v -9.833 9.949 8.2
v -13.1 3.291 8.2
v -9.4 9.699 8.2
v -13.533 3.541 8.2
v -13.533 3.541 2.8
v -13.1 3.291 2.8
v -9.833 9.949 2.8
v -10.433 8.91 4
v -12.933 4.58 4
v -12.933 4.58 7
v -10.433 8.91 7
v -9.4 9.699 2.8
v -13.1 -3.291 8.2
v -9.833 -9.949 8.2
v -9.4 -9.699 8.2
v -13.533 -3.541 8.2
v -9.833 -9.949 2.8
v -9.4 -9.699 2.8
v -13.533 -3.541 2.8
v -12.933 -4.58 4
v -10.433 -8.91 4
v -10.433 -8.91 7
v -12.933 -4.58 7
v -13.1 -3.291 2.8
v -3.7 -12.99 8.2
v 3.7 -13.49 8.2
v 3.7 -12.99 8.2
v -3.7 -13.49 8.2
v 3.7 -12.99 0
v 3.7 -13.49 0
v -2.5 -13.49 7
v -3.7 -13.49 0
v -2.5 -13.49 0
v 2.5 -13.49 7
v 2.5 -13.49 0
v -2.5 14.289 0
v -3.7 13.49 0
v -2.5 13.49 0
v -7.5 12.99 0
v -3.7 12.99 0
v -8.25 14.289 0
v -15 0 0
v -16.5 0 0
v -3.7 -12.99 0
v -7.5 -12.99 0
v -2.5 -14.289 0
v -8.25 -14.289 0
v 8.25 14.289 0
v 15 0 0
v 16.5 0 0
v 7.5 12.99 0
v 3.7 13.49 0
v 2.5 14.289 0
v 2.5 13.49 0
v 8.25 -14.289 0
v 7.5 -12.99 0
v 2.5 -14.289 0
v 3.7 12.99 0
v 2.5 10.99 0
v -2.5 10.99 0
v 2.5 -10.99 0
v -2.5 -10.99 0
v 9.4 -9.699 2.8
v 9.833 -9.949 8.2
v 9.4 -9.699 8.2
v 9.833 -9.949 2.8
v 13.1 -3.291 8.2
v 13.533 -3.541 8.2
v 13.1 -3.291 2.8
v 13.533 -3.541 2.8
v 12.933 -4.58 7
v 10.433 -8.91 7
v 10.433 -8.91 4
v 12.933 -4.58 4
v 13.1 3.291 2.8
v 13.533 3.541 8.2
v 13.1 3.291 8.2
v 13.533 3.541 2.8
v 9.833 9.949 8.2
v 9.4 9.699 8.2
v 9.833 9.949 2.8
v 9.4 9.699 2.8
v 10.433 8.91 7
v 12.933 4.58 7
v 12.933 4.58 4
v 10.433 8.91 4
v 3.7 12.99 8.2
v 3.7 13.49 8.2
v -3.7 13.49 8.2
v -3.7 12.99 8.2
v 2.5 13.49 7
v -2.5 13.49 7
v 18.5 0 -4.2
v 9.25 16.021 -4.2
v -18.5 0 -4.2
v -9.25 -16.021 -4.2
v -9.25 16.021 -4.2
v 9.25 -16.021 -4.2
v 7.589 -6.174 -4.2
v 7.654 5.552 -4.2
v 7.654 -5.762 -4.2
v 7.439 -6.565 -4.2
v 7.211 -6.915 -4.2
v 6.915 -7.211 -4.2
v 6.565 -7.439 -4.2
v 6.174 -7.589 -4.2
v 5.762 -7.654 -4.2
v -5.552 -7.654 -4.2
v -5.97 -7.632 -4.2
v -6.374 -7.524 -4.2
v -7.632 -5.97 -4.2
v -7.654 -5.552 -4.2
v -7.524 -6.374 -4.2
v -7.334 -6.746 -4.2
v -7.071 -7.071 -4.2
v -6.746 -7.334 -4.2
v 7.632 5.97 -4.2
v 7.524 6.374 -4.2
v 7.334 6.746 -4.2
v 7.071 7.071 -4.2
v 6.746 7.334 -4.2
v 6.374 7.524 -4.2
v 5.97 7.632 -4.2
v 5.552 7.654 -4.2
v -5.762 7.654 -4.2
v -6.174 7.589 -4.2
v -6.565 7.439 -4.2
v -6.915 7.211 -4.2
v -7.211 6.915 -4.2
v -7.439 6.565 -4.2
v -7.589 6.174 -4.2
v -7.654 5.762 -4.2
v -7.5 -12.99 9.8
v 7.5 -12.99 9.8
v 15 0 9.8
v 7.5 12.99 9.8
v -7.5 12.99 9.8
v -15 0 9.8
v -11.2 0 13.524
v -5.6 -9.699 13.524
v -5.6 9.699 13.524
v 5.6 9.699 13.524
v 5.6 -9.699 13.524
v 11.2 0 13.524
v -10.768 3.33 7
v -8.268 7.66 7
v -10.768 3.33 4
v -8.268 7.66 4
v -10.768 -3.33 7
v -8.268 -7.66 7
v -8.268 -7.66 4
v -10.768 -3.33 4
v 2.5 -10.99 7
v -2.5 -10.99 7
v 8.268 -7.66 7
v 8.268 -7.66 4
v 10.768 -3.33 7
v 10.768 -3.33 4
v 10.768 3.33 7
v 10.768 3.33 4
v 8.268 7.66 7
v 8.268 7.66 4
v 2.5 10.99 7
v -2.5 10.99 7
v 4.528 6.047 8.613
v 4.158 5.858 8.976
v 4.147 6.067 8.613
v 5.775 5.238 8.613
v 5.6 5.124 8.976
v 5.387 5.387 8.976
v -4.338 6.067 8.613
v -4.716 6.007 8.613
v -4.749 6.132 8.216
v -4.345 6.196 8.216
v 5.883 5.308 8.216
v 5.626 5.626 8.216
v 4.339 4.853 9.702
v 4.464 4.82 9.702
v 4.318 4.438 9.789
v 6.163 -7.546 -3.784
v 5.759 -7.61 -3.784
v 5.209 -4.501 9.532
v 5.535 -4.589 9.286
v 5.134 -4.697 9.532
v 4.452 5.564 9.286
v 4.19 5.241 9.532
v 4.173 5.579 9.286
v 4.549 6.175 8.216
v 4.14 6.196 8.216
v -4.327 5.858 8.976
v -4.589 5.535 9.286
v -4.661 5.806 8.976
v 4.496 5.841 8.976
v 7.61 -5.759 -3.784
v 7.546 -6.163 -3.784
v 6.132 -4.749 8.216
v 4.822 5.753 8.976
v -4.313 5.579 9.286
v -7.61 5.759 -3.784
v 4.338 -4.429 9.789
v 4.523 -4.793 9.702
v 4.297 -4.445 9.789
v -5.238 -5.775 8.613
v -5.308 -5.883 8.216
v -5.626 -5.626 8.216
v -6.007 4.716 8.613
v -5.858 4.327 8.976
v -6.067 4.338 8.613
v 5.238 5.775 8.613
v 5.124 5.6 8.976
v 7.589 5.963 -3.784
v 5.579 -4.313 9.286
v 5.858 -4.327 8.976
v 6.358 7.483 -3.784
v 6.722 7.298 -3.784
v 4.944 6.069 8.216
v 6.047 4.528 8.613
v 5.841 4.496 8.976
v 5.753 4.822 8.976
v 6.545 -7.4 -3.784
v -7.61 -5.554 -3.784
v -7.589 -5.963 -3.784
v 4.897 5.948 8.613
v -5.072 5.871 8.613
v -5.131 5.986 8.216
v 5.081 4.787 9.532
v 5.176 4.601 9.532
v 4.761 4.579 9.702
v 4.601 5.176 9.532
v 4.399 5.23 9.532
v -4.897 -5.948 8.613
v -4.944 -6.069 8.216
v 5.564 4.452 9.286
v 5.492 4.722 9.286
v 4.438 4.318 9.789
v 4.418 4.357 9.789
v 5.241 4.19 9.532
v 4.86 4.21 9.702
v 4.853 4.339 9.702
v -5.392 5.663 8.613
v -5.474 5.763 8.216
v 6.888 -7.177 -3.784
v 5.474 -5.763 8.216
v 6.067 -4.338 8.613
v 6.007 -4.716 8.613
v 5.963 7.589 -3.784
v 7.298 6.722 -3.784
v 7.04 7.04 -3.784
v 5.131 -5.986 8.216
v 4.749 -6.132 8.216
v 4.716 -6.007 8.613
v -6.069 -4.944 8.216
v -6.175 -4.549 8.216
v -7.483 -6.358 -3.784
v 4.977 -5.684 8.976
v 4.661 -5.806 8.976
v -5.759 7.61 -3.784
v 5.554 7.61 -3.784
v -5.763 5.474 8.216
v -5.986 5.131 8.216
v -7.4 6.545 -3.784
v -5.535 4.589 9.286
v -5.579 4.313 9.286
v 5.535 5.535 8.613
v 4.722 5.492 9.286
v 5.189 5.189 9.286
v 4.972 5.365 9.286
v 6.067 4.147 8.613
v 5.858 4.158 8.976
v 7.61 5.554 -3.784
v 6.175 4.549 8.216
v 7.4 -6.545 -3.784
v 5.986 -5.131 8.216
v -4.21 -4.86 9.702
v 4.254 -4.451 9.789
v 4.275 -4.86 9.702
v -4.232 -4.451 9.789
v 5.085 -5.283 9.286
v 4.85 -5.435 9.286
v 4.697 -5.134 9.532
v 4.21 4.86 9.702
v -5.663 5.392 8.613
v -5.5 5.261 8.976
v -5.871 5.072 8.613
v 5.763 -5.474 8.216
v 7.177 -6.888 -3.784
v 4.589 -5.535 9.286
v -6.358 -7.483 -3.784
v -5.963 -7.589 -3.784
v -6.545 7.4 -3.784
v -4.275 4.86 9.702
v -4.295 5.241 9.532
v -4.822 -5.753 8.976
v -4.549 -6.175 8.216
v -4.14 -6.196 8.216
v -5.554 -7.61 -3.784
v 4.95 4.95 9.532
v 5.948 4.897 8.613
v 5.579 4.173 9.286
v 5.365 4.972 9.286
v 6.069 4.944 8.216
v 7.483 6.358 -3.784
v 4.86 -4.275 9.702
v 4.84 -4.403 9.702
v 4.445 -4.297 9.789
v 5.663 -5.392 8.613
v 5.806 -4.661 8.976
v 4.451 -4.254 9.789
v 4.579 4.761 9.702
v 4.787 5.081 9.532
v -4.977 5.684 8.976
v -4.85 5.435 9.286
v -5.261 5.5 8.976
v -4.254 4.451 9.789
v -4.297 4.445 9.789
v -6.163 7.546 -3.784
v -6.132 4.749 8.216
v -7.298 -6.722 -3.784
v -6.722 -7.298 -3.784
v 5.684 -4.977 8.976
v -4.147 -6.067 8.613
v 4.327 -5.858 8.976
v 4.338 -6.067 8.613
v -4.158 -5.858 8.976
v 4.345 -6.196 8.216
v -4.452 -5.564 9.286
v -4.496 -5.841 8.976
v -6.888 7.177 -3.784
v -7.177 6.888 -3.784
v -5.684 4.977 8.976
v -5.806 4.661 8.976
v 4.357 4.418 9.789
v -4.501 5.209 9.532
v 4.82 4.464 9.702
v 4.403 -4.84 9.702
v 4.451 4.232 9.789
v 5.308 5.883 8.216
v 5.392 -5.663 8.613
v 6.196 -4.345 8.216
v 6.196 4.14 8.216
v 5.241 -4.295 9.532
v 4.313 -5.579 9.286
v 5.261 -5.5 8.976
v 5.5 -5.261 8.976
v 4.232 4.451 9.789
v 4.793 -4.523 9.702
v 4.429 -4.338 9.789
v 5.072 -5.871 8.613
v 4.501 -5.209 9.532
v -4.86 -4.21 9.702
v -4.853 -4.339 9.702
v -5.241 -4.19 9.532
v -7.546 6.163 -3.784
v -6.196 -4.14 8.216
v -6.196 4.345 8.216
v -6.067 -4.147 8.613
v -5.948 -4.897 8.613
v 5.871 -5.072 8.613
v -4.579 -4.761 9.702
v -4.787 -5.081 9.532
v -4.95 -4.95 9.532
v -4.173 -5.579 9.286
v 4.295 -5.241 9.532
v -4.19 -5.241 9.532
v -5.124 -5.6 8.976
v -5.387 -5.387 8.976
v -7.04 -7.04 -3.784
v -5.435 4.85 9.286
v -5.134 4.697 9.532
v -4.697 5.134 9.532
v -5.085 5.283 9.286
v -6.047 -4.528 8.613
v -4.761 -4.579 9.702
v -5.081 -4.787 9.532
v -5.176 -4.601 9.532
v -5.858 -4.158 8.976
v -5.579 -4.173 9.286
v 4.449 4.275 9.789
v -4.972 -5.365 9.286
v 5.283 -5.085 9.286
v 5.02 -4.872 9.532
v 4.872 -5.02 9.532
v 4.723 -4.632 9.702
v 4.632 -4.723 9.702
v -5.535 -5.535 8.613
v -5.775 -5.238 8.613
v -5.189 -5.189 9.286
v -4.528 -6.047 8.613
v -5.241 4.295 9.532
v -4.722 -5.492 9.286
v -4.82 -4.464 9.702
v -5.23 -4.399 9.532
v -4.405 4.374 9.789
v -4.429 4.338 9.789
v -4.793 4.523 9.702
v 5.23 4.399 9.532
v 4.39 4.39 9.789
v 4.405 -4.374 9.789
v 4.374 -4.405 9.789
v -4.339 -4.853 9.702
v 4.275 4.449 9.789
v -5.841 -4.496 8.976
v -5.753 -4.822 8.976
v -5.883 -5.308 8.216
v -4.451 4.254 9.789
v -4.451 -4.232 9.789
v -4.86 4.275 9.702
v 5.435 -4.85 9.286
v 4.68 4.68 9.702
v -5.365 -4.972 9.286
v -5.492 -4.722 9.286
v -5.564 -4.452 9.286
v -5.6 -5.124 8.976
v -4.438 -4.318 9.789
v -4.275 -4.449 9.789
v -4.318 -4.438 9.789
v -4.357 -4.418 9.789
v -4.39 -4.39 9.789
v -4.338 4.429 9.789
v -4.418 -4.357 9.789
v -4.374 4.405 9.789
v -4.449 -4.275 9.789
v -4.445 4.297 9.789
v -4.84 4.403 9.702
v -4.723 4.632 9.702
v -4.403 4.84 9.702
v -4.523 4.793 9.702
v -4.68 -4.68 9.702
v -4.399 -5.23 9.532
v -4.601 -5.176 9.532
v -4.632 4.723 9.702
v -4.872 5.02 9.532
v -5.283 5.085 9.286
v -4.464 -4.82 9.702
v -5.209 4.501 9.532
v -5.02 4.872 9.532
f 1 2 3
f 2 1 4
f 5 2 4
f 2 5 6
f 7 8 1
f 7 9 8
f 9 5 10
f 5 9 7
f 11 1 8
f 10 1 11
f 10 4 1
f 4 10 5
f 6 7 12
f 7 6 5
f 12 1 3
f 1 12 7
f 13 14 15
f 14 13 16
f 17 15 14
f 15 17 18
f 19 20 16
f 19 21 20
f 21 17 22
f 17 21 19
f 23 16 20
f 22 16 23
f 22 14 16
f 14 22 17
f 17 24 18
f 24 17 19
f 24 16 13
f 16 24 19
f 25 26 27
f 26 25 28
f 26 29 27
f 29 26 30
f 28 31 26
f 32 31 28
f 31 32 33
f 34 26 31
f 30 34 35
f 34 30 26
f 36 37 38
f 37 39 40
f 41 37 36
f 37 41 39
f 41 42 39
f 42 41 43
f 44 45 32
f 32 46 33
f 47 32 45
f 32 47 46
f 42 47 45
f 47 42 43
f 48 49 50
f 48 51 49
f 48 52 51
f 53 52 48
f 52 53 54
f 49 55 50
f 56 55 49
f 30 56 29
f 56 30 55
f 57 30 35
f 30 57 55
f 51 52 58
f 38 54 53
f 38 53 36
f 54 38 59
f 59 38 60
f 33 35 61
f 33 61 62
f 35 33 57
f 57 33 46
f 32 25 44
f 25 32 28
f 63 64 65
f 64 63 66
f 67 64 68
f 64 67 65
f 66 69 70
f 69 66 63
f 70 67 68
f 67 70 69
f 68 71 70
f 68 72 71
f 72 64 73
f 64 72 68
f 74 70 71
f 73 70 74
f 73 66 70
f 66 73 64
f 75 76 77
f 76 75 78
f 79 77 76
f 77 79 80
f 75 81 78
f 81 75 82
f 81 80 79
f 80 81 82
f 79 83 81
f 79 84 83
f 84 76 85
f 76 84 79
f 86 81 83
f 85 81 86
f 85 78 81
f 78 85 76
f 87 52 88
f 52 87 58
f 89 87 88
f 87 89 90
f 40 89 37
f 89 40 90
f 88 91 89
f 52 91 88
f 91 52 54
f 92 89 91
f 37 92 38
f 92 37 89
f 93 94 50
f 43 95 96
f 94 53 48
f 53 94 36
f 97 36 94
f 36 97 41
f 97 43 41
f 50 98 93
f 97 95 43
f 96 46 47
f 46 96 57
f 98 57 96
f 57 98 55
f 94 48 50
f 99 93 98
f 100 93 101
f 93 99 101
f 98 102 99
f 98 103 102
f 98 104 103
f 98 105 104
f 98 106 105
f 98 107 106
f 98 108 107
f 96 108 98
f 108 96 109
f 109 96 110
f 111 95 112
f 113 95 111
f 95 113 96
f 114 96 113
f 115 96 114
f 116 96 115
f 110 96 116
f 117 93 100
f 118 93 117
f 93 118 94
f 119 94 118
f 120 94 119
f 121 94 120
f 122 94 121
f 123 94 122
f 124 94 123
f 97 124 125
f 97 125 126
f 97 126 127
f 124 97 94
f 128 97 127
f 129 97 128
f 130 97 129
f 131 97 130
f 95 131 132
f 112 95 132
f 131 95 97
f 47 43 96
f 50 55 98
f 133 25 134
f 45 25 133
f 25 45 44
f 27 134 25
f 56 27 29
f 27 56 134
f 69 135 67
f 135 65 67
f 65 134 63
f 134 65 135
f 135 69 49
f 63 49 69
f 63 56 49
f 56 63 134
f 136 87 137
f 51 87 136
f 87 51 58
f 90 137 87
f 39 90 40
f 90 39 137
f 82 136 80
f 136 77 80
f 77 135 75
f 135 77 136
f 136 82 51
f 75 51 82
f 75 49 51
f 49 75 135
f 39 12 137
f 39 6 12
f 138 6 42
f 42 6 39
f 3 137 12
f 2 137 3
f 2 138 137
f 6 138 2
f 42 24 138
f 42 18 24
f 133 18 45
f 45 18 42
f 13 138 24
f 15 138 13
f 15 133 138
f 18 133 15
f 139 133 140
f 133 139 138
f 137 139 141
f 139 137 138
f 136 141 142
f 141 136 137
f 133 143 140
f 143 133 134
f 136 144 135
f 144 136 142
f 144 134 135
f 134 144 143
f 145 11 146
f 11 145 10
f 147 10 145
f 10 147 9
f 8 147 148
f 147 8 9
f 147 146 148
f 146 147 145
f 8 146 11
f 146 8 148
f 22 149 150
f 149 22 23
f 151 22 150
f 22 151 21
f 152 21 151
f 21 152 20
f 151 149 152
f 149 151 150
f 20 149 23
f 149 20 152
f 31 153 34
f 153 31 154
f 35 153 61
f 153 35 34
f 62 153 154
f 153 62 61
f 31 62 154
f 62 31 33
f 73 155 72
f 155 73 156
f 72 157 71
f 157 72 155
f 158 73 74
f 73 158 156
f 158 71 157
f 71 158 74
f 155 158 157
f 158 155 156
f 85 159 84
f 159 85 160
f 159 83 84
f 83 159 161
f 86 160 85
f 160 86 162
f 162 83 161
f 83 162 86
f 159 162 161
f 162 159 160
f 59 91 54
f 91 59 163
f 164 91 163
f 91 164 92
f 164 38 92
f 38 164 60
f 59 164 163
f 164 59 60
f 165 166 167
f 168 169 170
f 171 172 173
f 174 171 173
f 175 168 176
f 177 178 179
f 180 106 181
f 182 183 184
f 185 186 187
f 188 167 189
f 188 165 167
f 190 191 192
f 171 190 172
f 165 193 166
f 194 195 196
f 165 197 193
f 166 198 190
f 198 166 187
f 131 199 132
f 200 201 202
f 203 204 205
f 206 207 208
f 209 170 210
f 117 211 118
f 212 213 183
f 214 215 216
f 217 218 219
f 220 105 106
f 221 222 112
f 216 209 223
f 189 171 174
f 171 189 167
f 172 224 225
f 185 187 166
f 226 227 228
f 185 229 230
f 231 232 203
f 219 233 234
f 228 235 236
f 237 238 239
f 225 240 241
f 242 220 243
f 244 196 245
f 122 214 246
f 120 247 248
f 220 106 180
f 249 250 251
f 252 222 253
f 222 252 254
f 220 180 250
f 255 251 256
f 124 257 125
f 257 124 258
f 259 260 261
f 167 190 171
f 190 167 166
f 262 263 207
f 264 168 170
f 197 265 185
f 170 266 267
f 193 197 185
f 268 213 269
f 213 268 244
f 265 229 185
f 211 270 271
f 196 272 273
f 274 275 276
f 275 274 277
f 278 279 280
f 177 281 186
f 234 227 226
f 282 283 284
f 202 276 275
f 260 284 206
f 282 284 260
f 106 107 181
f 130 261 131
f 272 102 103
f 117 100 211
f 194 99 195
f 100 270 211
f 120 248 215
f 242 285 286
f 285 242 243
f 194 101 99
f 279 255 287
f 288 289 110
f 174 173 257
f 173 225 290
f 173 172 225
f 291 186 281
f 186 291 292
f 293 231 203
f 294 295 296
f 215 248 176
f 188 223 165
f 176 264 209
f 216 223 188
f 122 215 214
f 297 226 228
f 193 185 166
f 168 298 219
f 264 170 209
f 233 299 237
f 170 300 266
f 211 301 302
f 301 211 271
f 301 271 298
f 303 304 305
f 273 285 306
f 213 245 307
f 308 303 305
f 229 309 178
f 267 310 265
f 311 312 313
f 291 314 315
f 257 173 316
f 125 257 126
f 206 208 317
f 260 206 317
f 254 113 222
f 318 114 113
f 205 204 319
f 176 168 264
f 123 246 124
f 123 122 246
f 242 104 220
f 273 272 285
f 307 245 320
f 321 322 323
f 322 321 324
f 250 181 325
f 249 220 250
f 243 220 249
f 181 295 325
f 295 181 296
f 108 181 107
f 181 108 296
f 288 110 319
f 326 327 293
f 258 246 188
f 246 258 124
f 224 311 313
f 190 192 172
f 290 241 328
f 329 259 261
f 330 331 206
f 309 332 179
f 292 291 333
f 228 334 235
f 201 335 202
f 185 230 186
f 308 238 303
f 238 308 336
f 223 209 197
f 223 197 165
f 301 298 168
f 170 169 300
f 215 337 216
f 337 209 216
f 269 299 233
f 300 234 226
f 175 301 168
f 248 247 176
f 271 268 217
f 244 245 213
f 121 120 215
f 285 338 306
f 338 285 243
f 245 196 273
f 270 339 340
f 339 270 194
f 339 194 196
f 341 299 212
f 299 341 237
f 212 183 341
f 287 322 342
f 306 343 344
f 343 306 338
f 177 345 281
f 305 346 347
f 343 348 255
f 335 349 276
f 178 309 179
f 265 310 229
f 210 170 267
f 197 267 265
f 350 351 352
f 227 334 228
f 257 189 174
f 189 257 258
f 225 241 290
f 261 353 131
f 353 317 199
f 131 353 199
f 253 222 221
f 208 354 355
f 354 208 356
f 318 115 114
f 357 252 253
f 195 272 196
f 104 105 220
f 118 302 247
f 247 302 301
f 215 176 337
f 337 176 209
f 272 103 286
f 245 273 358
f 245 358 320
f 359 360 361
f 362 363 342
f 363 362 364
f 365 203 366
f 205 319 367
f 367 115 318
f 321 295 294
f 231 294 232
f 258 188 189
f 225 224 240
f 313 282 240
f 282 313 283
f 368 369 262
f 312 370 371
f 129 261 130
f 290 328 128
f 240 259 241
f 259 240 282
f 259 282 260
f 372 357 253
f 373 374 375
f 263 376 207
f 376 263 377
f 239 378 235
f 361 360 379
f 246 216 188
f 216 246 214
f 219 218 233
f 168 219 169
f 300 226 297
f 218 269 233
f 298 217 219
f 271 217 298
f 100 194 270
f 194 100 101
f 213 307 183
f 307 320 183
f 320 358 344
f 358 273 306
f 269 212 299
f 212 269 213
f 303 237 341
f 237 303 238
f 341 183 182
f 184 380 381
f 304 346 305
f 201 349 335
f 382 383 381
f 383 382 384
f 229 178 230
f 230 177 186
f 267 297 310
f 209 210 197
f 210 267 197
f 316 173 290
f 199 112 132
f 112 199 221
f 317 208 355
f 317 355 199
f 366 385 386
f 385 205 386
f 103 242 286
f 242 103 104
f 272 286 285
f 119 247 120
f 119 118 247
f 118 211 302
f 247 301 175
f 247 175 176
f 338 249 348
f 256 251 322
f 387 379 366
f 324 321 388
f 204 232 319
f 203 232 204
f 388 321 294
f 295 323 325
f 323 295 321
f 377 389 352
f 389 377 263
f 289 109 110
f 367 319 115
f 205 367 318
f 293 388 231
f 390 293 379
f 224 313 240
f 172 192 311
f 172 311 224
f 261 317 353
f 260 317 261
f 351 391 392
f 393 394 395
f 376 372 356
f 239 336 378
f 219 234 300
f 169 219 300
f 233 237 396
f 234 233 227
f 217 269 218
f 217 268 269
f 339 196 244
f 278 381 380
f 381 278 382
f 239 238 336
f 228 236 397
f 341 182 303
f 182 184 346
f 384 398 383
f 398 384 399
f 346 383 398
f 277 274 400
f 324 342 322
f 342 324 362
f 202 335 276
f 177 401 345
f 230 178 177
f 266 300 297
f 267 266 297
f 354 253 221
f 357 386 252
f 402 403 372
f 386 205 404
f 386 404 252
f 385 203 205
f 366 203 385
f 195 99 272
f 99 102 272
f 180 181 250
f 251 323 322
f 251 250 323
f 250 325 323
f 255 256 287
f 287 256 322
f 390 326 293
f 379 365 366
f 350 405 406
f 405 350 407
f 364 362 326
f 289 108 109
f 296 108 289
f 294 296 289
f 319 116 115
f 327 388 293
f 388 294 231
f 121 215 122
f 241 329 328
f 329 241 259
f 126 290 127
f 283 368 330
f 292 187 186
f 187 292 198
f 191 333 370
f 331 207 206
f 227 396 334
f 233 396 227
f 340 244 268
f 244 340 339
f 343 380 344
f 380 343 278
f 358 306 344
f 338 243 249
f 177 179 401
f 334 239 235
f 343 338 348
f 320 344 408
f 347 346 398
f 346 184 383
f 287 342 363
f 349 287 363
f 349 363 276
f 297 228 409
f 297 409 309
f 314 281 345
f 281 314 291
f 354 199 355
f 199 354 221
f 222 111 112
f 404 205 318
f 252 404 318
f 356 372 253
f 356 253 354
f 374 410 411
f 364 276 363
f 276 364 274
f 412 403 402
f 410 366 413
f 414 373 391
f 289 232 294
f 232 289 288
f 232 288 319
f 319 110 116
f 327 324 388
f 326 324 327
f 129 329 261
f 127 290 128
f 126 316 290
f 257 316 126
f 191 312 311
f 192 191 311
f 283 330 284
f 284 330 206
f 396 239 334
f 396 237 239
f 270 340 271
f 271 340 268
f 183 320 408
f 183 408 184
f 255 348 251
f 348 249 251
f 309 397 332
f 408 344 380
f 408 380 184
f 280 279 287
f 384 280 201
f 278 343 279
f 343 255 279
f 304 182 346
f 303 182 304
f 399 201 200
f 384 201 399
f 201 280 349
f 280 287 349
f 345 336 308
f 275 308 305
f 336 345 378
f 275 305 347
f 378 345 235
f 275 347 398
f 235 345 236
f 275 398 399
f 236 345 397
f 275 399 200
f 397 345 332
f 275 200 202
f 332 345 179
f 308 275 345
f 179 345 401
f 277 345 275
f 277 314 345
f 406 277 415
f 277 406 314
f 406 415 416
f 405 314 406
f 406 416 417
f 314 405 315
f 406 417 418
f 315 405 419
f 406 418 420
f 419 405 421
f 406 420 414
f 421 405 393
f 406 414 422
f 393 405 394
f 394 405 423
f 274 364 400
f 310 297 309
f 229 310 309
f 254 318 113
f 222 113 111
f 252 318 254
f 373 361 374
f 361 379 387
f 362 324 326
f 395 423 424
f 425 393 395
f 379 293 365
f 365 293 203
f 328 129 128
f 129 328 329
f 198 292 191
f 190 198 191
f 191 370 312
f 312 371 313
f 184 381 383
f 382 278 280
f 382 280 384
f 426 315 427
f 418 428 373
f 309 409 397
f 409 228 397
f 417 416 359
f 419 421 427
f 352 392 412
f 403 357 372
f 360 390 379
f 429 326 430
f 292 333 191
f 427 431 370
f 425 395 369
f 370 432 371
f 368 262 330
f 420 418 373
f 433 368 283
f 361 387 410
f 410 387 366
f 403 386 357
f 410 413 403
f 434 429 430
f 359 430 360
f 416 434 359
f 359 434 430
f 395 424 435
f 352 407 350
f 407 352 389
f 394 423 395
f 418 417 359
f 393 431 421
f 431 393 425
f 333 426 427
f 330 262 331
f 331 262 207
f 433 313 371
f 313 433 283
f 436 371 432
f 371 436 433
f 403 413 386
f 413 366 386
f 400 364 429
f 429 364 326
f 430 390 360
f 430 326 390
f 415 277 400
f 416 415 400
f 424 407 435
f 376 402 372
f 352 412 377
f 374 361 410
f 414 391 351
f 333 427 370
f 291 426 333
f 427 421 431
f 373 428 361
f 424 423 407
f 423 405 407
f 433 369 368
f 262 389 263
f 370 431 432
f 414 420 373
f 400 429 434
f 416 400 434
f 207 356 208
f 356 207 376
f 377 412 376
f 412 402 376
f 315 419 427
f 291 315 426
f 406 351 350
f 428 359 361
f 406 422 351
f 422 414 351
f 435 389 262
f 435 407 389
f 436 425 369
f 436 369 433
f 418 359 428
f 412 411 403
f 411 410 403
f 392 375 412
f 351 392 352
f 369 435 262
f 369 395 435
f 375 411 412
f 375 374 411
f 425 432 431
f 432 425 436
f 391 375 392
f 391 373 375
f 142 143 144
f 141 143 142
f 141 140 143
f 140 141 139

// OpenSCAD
// Copyright 2019 Pascal de Bruijn
// Licensed Creative Commons - Attribution - Share Alike

/* [Building] */

// Base size of the building (peek-to-peek hex in millimeters)
hex_size = 37;

// Approximate building storey height (in millimeters)
storey_height = 9.8;

/* [Windows] */

// How high your windows should be (in millimeters)
window_height = 3;

// How wide your windows should be (in millimeters)
window_width = 5;

// How far the window cavity should protrude into the building (in millimeters)
window_depth = 2;

// How thick the window frame is (in millimeters) (needs to be twice your nozzle size to print vertically)
window_frame_width = 1.2;

// How deep the window frame is (in millimeters)
window_frame_depth = 0.5;

/* [Doors] */

// How high your door should be (in millimeters)
door_height = 7;

// How wide your doors should be (in millimeters)
door_width = 5;

// How far the door cavity should protrude into the building (in millimeters)
door_depth = 2;

// How thick the door frame is (in millimeters) (needs to be twice your nozzle size to print vertically)
door_frame_width = 1.2;

// How deep the door frame is (in millimeters)
door_frame_depth = 0.5;

/* [Base] */

// How high the base should be (in millimeters)
base_height = 4.2;

// How much clearance the base should have around the building (in millimeters)
base_top_clearance = 1.5;

// How much much larger the bottom of the base should be than the bottom (in millimeters)
base_bottom_clearance = 2;

// Should the base be hollowed out (in millimeters)
base_cavity_depth = -1;

// How thick in the base edge should be (in millimeters)
base_cavity_clearance = 3;

/* [Model] */

// Overall model scale (as percentage)
model_scale = 100;

// Size of the die that should fit in the die cavity (in millimeters)
die_size = 12;

// Rounding of the die cavity (in millimeters)
die_round_radius = 2;

// Do you want to model to be hollow
hollow = 0; // [0:Solid,1:Hollow]



/* [Hidden] */

door_div = 3;

hex_size_scaled = hex_size - (base_top_clearance * 2) - (base_bottom_clearance * 2);



scale(v=[model_scale / 100, model_scale / 100, model_scale / 100])
{
  difference()
  {
    union()
    {
    
      // base
      translate([0, 0, 0 - base_height])
        cylinder(base_height, (hex_size_scaled / 2) + base_top_clearance + base_bottom_clearance, (hex_size_scaled / 2) + base_top_clearance, $fn = 6);

      // main building
      cylinder(storey_height, (hex_size_scaled / 2), (hex_size_scaled / 2), $fn = 6);

      // upper building
      translate([0, 0, storey_height])
        cylinder(storey_height, (hex_size_scaled / 2), (hex_size_scaled / 2) / 3, $fn = 6);

      // door frames
      for (a = [1:6])
        rotate(a * 60)
          if ((a % door_div) == 0)
            translate([-(door_width / 2) - door_frame_width, (hex_size_scaled * (cos(30)/2)) - door_depth + door_frame_depth, 0])
              cube([door_width + (door_frame_width * 2), door_depth, door_height + door_frame_width]);
          else
            translate([-(door_width / 2) - window_frame_width, (hex_size_scaled * (cos(30)/2)) - window_depth + window_frame_depth, door_height - window_height - window_frame_width])
              cube([window_width + (window_frame_width * 2), window_depth, window_height + window_frame_width * 2]);

    }

    union()
    {
      // base cavity
      translate([0, 0, 0 - base_height - (base_height - base_cavity_depth)])
        cylinder(base_height, (hex_size_scaled / 2) + base_top_clearance + base_bottom_clearance - base_cavity_clearance, (hex_size_scaled / 2) + base_top_clearance - base_cavity_clearance, $fn = 6); 

      // hollow
      if (hollow)
        translate([0, 0, 0])
          minkowski ()
          {
            cylinder(storey_height * 5.5 - (hex_size / 2) - 13, 1, 1, $fn = 48);
            sphere(r = (hex_size / 2) - 13);
          }

      // hidden die cavity
      if (die_size > 0)
        rotate(45)
          translate([0, 0, 0 - base_height])
            minkowski()
            {
              cylinder(die_size, (die_size / 2) + die_round_radius, (die_size / 2), $fn = 4);
              sphere(r = die_round_radius, $fn = 30);
            }
      
      // door cavities
      for (a = [1:6])
        rotate(a * 60)
          if ((a % door_div) == 0)
            translate([-door_width / 2, (hex_size_scaled * (cos(30)/2)) - door_depth, 0])
              cube([door_width, door_depth + door_frame_depth + 1, door_height]);
          else
            translate([-door_width / 2, (hex_size_scaled * (cos(30)/2)) - door_depth, door_height - window_height])
              cube([window_width, window_depth + window_frame_depth + 1, window_height]);

      // flat roof
      translate([0, 0, storey_height * 1.38])
        cylinder(storey_height, hex_size_scaled, hex_size_scaled, $fn = 6);
        
      // make sure nothing protrudes down from the bottom
      translate([0, 0, 0 - base_height - hex_size_scaled])
        cylinder(hex_size_scaled, hex_size_scaled, hex_size_scaled, $fn = 6);        
        
    }
  }
}
